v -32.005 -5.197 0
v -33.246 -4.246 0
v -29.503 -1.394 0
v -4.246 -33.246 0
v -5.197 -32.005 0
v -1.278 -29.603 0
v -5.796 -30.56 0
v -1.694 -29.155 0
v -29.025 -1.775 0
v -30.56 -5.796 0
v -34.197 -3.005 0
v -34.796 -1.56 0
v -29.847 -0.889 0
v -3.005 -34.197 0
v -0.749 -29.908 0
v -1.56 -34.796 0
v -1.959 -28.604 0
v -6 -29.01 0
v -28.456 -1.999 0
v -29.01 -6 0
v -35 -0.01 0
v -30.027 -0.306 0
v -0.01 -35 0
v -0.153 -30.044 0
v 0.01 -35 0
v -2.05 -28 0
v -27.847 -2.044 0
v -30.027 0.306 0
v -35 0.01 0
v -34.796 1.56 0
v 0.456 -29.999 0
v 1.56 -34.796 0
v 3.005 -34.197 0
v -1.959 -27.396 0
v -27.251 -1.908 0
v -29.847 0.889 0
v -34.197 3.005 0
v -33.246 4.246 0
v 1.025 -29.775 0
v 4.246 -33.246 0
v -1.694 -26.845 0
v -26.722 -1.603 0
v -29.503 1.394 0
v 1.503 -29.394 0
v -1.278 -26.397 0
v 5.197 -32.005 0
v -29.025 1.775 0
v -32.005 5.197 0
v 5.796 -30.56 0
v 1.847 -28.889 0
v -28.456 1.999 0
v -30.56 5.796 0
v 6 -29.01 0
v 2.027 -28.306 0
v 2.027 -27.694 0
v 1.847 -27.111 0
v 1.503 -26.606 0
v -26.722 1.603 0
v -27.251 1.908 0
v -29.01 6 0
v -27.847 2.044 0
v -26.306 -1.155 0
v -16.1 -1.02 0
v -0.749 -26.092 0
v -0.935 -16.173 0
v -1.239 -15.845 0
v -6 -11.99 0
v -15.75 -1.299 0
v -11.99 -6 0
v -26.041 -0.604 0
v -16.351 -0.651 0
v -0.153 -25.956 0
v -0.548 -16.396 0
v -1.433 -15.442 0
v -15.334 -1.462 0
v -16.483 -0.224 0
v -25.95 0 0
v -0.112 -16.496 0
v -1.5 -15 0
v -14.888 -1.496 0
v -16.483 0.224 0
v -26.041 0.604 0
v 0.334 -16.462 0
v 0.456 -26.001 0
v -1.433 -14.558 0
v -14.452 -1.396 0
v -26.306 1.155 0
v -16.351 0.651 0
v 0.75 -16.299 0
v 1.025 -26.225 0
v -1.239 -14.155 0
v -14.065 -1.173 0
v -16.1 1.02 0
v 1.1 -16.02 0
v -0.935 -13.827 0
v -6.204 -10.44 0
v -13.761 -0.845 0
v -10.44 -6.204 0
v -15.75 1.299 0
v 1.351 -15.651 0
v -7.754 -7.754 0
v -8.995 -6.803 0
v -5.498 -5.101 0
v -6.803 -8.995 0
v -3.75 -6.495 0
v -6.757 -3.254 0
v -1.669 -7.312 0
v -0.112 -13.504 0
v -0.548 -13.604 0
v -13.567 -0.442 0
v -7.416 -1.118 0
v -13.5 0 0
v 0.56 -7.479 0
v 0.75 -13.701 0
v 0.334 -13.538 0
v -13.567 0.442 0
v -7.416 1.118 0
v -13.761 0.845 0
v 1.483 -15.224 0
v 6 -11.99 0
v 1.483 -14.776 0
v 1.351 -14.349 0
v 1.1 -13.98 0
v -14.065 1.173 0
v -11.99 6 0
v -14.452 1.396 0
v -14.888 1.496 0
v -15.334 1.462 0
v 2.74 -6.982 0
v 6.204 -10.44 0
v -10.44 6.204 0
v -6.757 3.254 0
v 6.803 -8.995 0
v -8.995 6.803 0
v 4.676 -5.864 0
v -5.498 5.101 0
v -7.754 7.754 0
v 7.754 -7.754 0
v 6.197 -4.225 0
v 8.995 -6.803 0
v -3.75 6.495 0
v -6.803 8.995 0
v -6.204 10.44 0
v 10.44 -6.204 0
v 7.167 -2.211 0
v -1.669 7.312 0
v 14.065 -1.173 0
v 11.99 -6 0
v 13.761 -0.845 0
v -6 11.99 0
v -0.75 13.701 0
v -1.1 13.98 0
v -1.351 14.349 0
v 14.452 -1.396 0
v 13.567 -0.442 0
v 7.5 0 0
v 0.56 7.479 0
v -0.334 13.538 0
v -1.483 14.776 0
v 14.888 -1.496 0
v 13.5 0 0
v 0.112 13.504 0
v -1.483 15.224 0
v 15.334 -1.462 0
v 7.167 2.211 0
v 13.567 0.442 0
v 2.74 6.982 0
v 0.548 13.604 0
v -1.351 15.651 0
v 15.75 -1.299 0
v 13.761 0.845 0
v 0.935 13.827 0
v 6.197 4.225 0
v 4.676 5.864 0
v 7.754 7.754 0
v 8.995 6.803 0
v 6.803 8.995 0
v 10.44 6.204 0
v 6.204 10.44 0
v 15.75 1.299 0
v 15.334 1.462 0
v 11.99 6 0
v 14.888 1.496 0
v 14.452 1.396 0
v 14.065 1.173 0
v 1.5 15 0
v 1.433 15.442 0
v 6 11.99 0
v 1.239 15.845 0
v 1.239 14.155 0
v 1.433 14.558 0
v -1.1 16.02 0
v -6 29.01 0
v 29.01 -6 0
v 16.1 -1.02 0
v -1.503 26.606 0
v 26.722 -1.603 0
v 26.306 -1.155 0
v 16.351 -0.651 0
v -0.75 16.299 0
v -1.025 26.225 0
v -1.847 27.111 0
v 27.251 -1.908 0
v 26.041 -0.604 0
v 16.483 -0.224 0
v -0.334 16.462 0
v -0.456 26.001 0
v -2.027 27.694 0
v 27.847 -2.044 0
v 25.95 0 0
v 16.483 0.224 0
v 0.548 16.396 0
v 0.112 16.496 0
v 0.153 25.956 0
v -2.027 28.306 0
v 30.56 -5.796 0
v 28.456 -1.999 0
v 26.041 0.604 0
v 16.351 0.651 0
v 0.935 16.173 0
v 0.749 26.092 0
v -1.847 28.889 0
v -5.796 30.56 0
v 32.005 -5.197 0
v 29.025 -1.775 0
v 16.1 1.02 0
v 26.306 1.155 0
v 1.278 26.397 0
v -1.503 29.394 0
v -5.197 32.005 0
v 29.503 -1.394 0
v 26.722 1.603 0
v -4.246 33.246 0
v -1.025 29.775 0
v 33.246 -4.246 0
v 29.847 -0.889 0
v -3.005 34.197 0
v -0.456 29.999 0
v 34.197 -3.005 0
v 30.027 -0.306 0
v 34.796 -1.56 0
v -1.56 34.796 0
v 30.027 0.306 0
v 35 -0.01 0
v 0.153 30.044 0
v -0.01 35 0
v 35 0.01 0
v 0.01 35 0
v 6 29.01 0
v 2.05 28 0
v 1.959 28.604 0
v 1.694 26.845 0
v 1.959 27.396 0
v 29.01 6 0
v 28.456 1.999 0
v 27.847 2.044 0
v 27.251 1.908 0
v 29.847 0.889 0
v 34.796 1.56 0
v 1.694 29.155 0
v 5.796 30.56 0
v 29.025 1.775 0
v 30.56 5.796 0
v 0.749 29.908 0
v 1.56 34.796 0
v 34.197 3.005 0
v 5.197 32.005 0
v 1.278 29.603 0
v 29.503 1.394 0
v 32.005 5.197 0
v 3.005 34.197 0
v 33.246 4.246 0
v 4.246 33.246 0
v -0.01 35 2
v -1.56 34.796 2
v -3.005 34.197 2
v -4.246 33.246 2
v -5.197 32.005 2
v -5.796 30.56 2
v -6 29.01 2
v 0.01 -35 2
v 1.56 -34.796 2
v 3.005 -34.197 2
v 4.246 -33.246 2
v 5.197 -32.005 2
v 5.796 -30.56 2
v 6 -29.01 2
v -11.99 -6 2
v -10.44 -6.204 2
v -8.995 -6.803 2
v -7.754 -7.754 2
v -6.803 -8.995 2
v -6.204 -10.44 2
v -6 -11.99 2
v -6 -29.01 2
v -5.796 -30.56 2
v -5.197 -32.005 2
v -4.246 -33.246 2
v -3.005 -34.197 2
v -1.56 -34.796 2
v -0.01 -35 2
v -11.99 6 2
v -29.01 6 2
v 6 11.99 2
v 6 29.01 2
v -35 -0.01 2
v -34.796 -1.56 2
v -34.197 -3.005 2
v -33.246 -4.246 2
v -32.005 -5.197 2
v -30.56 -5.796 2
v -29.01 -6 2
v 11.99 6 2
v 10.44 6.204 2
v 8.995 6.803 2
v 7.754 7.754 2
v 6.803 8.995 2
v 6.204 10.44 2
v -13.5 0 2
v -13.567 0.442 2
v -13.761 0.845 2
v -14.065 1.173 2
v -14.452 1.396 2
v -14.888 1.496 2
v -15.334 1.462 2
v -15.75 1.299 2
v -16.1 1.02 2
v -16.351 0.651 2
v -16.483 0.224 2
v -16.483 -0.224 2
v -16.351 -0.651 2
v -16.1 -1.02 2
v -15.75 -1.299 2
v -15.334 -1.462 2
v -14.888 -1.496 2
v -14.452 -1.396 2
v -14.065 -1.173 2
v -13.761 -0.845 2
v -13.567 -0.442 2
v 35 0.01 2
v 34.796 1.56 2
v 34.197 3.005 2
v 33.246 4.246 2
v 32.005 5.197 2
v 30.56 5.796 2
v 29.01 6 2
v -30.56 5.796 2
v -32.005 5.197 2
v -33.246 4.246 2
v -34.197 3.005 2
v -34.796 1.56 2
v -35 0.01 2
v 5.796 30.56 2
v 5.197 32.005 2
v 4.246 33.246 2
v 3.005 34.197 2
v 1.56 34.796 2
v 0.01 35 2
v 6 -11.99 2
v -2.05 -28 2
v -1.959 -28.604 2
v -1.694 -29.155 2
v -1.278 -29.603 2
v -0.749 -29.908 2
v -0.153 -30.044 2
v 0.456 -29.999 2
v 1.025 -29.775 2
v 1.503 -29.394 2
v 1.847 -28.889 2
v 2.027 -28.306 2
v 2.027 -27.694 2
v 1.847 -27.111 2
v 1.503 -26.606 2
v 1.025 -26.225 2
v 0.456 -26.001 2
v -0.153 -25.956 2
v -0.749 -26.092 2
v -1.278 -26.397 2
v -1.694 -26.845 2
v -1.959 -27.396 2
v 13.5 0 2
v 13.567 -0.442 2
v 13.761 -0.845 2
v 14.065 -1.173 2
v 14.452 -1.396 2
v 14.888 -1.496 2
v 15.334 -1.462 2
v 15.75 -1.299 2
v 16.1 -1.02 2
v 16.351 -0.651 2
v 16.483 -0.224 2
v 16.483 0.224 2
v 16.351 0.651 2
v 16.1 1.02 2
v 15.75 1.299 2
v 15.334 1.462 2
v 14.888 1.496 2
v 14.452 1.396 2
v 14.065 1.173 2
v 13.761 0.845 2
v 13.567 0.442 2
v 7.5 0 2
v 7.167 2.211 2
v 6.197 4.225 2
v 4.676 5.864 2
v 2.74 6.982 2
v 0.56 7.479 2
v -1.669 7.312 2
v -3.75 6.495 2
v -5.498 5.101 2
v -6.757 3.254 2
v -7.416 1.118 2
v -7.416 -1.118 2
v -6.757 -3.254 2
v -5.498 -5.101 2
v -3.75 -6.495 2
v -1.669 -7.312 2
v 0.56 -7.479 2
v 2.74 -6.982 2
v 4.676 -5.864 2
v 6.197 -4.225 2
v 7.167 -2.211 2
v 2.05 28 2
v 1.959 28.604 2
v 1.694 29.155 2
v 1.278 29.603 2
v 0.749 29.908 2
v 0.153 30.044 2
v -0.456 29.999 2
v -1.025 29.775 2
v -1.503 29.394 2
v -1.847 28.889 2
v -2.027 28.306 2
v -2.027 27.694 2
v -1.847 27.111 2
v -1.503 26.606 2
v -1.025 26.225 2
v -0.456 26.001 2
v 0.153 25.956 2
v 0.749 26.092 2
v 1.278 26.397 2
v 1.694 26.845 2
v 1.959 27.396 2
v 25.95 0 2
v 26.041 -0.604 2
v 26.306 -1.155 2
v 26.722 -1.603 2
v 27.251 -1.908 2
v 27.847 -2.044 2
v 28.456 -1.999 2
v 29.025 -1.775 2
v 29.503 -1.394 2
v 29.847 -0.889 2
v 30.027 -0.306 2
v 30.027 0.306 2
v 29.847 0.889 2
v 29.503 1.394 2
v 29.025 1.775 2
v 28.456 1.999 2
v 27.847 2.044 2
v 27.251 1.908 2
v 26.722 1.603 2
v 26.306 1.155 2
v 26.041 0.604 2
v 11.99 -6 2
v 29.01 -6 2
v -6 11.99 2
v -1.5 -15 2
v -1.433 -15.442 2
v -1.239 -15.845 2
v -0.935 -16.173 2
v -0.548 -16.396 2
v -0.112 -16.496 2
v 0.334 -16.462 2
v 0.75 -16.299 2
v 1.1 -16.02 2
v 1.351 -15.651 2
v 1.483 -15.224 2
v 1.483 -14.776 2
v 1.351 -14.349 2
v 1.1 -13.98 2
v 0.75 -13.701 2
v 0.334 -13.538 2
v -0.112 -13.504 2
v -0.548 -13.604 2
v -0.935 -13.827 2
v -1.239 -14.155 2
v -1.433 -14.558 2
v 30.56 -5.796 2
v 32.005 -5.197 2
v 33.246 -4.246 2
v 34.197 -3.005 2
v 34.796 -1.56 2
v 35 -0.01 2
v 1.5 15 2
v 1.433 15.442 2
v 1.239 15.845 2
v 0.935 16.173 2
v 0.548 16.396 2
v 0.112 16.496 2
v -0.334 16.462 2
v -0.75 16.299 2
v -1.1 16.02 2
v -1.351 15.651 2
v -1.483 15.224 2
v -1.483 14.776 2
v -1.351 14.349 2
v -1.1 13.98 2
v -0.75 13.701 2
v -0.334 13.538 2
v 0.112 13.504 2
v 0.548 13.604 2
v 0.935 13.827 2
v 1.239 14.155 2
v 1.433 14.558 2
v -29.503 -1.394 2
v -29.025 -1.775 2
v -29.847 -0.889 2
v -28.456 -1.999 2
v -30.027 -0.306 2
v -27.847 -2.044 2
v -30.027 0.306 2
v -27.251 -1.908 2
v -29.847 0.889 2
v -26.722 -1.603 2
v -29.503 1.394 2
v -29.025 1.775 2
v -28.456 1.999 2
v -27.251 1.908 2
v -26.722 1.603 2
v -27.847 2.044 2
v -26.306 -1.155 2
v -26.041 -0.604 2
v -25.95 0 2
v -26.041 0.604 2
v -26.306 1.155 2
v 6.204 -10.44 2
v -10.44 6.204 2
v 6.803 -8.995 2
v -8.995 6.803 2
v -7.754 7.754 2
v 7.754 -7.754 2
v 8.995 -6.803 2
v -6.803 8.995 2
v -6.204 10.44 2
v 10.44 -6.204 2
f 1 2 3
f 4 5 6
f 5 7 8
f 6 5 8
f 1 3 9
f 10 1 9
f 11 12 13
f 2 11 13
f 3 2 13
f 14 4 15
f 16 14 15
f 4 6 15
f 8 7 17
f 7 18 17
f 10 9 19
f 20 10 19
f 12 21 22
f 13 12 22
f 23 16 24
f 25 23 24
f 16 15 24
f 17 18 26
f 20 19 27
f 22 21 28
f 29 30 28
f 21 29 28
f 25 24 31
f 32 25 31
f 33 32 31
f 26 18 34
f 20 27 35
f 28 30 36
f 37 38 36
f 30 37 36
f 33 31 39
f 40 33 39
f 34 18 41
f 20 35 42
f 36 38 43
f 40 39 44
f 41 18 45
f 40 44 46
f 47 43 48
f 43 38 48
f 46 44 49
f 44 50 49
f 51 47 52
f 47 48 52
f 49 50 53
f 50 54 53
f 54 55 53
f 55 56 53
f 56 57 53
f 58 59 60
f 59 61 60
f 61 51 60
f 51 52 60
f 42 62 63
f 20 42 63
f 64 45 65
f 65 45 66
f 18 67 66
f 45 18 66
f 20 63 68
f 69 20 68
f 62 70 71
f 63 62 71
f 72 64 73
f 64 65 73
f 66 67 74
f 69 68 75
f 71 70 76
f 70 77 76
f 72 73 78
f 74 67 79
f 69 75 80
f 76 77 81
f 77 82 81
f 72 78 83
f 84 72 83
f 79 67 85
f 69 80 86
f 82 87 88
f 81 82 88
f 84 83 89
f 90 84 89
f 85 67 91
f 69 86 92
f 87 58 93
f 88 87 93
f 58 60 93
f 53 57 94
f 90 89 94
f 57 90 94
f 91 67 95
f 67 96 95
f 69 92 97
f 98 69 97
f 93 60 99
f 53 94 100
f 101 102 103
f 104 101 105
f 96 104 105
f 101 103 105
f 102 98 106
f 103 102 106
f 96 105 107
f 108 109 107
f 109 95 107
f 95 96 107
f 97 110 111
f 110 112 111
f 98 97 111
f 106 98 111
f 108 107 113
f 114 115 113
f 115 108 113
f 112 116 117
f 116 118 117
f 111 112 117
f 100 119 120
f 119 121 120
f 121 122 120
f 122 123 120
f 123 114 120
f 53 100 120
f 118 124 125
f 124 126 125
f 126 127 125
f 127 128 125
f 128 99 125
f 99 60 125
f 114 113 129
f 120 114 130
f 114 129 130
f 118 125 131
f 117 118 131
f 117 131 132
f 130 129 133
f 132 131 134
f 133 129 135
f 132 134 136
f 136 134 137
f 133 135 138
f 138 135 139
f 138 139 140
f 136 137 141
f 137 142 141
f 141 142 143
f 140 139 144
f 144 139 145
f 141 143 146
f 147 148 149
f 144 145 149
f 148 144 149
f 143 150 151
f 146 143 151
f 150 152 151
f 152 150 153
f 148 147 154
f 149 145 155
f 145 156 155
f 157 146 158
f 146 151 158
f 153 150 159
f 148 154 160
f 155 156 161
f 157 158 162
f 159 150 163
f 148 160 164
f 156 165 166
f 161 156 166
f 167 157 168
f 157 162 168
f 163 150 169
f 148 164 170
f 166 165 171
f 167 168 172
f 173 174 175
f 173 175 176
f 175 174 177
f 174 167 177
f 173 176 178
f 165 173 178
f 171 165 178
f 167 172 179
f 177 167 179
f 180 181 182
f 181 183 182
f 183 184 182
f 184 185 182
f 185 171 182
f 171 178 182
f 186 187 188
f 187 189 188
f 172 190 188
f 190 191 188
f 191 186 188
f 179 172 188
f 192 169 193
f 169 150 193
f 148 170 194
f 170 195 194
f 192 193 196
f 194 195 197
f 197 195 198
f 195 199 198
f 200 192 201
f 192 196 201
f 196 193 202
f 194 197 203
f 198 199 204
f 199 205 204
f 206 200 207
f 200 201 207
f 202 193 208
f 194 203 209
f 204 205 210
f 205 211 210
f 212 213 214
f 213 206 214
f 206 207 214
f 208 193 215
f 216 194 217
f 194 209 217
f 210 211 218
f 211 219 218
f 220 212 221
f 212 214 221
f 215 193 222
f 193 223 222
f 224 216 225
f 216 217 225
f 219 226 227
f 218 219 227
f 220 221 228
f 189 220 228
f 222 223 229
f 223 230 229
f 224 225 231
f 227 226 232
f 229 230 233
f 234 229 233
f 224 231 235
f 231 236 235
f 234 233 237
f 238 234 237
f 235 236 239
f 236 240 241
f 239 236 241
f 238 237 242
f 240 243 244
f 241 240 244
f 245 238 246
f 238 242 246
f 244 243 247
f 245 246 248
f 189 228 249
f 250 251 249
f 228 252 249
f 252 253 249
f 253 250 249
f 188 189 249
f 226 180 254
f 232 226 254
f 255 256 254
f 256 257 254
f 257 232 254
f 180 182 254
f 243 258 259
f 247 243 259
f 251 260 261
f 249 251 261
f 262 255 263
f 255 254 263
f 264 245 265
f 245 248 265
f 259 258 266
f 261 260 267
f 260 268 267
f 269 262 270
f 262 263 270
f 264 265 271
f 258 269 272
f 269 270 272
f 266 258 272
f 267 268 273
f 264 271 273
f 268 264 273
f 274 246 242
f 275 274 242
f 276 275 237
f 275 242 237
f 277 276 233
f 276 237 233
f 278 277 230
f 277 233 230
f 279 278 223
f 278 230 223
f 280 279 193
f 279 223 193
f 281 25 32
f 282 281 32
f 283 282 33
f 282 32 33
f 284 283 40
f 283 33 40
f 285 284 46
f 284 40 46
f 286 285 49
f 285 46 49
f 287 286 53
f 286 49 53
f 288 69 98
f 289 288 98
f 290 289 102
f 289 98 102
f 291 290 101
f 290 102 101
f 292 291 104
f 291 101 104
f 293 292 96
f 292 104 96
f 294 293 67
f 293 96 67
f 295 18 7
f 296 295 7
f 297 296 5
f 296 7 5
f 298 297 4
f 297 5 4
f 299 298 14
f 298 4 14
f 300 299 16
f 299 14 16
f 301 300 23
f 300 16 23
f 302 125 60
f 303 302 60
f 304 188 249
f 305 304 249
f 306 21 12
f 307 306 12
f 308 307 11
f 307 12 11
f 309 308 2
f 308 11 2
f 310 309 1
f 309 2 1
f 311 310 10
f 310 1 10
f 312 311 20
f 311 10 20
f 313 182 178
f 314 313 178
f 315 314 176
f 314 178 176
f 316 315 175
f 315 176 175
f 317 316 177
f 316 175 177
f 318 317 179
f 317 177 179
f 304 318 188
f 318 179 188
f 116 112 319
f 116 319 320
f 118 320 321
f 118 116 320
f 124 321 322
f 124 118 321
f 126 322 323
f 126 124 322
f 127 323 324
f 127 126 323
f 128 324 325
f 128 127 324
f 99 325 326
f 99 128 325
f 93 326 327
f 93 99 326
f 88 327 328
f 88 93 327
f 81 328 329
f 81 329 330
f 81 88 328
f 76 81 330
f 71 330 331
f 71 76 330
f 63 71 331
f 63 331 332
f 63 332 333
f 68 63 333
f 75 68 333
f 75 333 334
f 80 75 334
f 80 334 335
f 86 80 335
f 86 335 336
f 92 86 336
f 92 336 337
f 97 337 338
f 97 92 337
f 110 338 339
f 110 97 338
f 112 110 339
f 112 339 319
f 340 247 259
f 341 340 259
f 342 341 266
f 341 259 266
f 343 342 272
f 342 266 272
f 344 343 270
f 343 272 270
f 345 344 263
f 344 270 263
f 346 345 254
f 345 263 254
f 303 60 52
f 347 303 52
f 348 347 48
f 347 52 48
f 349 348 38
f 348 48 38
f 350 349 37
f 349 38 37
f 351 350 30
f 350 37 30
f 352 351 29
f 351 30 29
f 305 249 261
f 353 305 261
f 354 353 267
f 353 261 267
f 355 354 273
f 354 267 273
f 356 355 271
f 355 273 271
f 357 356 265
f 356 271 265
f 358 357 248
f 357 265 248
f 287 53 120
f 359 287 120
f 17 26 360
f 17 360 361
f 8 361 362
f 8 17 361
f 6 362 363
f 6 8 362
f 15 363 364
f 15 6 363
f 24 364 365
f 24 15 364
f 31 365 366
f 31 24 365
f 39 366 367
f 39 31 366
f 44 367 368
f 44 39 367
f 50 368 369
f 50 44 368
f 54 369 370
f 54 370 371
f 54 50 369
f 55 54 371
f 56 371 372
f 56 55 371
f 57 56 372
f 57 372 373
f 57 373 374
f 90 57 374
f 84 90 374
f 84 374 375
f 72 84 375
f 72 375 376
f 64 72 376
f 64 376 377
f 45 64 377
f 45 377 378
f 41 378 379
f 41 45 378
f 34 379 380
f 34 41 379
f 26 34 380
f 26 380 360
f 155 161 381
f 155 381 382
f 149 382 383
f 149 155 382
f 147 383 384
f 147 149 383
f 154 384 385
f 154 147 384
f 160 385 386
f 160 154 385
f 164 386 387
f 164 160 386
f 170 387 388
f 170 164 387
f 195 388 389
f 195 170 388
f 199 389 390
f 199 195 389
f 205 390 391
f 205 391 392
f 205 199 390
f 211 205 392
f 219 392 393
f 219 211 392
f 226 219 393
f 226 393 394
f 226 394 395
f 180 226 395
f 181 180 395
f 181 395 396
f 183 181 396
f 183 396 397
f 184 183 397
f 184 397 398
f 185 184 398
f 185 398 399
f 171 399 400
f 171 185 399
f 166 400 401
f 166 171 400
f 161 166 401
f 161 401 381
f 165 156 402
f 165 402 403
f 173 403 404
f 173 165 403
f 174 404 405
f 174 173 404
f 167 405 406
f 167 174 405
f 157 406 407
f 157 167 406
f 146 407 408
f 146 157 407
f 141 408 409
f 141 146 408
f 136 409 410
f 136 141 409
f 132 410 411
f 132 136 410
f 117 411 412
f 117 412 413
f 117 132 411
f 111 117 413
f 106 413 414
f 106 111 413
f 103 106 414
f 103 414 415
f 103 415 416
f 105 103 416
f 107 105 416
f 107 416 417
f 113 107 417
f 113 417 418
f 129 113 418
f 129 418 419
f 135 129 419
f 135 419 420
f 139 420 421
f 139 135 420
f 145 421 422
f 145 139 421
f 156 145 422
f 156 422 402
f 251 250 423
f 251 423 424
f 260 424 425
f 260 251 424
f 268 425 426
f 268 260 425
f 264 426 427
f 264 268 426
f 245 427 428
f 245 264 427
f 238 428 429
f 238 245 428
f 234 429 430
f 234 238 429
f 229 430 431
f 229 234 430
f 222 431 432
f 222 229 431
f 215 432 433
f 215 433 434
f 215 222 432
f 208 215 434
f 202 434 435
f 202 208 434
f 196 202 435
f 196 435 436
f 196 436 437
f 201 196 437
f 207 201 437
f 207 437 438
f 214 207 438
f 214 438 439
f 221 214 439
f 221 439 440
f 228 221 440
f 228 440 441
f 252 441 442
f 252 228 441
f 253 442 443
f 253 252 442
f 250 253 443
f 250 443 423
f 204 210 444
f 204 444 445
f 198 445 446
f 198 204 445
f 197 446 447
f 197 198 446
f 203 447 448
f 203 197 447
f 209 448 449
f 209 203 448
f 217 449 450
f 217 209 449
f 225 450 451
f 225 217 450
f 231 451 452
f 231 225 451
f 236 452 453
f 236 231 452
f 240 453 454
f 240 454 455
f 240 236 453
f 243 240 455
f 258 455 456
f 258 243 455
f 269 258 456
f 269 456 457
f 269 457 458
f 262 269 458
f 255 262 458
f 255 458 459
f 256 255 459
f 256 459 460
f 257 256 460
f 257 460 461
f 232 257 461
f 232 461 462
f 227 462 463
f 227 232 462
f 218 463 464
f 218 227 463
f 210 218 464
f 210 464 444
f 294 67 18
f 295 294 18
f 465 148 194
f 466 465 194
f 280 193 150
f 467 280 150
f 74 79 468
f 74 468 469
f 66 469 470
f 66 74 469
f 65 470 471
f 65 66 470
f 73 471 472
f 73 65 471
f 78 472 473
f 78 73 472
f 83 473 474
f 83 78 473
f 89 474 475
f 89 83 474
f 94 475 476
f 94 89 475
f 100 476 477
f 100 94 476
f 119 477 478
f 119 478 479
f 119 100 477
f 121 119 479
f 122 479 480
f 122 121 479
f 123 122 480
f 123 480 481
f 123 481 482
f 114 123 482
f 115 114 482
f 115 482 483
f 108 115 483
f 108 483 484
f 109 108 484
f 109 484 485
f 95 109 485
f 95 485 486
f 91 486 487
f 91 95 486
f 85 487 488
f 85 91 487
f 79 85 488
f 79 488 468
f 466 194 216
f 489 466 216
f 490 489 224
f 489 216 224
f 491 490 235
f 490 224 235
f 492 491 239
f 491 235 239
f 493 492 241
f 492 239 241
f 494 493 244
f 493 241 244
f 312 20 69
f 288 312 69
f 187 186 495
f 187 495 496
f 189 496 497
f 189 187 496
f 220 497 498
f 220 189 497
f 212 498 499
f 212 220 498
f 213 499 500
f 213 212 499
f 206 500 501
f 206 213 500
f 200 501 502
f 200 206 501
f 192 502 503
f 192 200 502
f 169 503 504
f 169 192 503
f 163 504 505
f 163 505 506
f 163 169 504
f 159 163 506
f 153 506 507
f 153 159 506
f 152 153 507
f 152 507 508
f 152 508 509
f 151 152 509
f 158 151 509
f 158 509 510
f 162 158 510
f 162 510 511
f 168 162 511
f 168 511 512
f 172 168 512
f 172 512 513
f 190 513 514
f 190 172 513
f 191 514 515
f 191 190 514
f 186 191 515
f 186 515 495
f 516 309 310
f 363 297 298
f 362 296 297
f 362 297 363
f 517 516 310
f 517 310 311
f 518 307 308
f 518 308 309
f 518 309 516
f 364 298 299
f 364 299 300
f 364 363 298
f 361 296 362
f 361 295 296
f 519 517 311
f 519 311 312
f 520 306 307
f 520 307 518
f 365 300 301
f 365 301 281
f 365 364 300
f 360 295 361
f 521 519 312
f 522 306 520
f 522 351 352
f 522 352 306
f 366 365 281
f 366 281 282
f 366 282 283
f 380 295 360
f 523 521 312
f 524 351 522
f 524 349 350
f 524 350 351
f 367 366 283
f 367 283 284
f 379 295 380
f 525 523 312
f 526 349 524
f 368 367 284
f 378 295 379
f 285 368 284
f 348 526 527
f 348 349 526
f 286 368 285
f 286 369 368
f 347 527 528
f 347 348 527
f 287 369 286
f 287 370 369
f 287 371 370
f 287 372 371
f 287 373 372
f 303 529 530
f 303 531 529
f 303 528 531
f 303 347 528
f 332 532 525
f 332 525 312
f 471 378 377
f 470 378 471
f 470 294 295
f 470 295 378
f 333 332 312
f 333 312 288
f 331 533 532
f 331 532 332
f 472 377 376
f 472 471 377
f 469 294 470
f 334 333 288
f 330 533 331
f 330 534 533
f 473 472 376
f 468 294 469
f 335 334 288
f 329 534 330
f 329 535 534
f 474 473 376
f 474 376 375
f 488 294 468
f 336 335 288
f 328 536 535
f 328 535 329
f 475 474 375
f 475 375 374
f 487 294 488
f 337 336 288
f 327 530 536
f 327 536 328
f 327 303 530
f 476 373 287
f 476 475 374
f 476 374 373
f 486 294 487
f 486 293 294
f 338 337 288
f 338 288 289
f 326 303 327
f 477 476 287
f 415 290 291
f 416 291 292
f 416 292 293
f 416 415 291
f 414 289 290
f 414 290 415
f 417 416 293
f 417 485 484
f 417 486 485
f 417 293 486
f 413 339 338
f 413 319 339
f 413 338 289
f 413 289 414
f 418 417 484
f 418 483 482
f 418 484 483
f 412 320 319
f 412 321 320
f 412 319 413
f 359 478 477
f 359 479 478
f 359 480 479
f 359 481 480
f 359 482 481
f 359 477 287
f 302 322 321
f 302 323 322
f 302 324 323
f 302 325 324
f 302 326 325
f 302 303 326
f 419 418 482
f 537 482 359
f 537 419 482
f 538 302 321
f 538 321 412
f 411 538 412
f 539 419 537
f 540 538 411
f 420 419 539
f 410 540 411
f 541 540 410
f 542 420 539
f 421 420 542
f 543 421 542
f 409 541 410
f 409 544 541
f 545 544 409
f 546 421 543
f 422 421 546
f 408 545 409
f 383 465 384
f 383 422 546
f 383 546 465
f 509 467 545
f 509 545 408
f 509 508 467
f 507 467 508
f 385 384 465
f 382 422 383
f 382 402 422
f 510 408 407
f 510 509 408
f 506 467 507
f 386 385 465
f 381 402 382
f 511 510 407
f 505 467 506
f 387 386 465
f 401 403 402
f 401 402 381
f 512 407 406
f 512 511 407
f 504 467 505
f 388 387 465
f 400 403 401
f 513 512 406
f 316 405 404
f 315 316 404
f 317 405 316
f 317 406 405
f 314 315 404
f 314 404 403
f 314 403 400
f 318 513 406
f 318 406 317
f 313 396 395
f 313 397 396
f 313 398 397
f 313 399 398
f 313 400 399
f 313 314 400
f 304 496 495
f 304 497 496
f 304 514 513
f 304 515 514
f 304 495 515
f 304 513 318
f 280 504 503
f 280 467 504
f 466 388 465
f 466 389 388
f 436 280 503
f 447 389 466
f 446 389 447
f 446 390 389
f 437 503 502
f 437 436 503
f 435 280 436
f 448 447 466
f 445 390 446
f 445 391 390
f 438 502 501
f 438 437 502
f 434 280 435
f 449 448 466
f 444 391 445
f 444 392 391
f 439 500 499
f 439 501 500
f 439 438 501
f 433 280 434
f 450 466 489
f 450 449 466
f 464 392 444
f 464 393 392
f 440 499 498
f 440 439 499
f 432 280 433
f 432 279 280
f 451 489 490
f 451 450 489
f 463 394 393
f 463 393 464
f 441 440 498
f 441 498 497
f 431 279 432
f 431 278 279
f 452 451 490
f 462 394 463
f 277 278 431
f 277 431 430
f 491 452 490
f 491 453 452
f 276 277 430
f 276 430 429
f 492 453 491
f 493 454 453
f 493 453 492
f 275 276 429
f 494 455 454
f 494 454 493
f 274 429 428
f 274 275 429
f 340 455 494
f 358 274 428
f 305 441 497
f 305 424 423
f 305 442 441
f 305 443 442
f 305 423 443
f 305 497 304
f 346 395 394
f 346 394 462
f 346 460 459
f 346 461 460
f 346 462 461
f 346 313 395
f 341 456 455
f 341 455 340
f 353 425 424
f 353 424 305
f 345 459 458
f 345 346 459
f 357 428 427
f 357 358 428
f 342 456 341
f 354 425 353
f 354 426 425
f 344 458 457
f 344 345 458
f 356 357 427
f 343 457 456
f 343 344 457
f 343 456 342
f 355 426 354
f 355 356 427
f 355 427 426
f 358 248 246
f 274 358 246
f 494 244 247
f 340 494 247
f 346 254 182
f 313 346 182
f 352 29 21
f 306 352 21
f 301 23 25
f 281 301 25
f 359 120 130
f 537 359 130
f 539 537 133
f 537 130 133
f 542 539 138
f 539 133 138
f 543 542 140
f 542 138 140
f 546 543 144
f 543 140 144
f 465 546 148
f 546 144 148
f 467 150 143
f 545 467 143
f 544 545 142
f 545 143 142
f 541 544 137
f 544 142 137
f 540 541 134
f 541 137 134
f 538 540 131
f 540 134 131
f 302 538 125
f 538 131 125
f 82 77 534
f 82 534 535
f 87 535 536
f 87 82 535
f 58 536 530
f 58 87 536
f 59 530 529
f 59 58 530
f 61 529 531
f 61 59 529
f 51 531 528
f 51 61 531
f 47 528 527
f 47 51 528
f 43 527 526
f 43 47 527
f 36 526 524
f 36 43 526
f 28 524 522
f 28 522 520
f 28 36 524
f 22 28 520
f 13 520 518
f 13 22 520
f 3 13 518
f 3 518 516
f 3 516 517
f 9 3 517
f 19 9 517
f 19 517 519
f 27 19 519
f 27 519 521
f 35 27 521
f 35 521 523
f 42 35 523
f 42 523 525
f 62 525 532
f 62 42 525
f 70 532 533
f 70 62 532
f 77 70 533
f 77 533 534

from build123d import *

# Parameters (mm, degrees)
SKETCH1_R           = 7.5
SKETCH1_R_2         = 2.05
SKETCH1_R_3         = 1.5
BOSS_EXTRUDE1_DEPTH = 2


with BuildPart() as part:
    # Sketch1 → Boss-Extrude1 (new body)
    with BuildSketch(Plane.XY):
        with BuildLine():
            Line((11.99, -6), (29.01, -6))
            ThreePointArc((29.01, -6), (33.245569619, -4.245569619), (35, -0.01))
            Line((35, -0.01), (35, 0.01))
            ThreePointArc((35, 0.01), (33.245569619, 4.245569619), (29.01, 6))
            Line((29.01, 6), (11.99, 6))
            ThreePointArc((11.99, 6), (7.754430381, 7.754430381), (6, 11.99))
            Line((6, 11.99), (6, 29.01))
            ThreePointArc((6, 29.01), (4.245569619, 33.245569619), (0.01, 35))
            Line((0.01, 35), (-0.01, 35))
            ThreePointArc((-0.01, 35), (-4.245569619, 33.245569619), (-6, 29.01))
            Line((-6, 29.01), (-6, 11.99))
            ThreePointArc((-6, 11.99), (-7.754430381, 7.754430381), (-11.99, 6))
            Line((-11.99, 6), (-29.01, 6))
            ThreePointArc((-29.01, 6), (-33.245569619, 4.245569619), (-35, 0.01))
            Line((-35, 0.01), (-35, -0.01))
            ThreePointArc((-35, -0.01), (-33.245569619, -4.245569619), (-29.01, -6))
            Line((-29.01, -6), (-11.99, -6))
            ThreePointArc((-11.99, -6), (-7.754430381, -7.754430381), (-6, -11.99))
            Line((-6, -11.99), (-6, -29.01))
            ThreePointArc((-6, -29.01), (-4.245569619, -33.245569619), (-0.01, -35))
            Line((-0.01, -35), (0.01, -35))
            ThreePointArc((0.01, -35), (4.245569619, -33.245569619), (6, -29.01))
            Line((6, -29.01), (6, -11.99))
            ThreePointArc((6, -11.99), (7.754430381, -7.754430381), (11.99, -6))
        make_face()
        Circle(SKETCH1_R, mode=Mode.SUBTRACT)
        with Locations((-28, 0)):
            Circle(SKETCH1_R_2, mode=Mode.SUBTRACT)
        with Locations(Location((28, 0, 0), (0, 0, 180))):
            Circle(SKETCH1_R_2, mode=Mode.SUBTRACT)
        with Locations((0, 28)):
            Circle(SKETCH1_R_2, mode=Mode.SUBTRACT)
        with Locations(Location((0, -28, 0), (0, 0, 180))):
            Circle(SKETCH1_R_2, mode=Mode.SUBTRACT)
        with Locations((0, 15)):
            Circle(SKETCH1_R_3, mode=Mode.SUBTRACT)
        with Locations(Location((0, -15, 0), (0, 0, 180))):
            Circle(SKETCH1_R_3, mode=Mode.SUBTRACT)
        with Locations((-15, 0)):
            Circle(SKETCH1_R_3, mode=Mode.SUBTRACT)
        with Locations(Location((15, 0, 0), (0, 0, 180))):
            Circle(SKETCH1_R_3, mode=Mode.SUBTRACT)
    extrude(amount=BOSS_EXTRUDE1_DEPTH)


solid = part.part
